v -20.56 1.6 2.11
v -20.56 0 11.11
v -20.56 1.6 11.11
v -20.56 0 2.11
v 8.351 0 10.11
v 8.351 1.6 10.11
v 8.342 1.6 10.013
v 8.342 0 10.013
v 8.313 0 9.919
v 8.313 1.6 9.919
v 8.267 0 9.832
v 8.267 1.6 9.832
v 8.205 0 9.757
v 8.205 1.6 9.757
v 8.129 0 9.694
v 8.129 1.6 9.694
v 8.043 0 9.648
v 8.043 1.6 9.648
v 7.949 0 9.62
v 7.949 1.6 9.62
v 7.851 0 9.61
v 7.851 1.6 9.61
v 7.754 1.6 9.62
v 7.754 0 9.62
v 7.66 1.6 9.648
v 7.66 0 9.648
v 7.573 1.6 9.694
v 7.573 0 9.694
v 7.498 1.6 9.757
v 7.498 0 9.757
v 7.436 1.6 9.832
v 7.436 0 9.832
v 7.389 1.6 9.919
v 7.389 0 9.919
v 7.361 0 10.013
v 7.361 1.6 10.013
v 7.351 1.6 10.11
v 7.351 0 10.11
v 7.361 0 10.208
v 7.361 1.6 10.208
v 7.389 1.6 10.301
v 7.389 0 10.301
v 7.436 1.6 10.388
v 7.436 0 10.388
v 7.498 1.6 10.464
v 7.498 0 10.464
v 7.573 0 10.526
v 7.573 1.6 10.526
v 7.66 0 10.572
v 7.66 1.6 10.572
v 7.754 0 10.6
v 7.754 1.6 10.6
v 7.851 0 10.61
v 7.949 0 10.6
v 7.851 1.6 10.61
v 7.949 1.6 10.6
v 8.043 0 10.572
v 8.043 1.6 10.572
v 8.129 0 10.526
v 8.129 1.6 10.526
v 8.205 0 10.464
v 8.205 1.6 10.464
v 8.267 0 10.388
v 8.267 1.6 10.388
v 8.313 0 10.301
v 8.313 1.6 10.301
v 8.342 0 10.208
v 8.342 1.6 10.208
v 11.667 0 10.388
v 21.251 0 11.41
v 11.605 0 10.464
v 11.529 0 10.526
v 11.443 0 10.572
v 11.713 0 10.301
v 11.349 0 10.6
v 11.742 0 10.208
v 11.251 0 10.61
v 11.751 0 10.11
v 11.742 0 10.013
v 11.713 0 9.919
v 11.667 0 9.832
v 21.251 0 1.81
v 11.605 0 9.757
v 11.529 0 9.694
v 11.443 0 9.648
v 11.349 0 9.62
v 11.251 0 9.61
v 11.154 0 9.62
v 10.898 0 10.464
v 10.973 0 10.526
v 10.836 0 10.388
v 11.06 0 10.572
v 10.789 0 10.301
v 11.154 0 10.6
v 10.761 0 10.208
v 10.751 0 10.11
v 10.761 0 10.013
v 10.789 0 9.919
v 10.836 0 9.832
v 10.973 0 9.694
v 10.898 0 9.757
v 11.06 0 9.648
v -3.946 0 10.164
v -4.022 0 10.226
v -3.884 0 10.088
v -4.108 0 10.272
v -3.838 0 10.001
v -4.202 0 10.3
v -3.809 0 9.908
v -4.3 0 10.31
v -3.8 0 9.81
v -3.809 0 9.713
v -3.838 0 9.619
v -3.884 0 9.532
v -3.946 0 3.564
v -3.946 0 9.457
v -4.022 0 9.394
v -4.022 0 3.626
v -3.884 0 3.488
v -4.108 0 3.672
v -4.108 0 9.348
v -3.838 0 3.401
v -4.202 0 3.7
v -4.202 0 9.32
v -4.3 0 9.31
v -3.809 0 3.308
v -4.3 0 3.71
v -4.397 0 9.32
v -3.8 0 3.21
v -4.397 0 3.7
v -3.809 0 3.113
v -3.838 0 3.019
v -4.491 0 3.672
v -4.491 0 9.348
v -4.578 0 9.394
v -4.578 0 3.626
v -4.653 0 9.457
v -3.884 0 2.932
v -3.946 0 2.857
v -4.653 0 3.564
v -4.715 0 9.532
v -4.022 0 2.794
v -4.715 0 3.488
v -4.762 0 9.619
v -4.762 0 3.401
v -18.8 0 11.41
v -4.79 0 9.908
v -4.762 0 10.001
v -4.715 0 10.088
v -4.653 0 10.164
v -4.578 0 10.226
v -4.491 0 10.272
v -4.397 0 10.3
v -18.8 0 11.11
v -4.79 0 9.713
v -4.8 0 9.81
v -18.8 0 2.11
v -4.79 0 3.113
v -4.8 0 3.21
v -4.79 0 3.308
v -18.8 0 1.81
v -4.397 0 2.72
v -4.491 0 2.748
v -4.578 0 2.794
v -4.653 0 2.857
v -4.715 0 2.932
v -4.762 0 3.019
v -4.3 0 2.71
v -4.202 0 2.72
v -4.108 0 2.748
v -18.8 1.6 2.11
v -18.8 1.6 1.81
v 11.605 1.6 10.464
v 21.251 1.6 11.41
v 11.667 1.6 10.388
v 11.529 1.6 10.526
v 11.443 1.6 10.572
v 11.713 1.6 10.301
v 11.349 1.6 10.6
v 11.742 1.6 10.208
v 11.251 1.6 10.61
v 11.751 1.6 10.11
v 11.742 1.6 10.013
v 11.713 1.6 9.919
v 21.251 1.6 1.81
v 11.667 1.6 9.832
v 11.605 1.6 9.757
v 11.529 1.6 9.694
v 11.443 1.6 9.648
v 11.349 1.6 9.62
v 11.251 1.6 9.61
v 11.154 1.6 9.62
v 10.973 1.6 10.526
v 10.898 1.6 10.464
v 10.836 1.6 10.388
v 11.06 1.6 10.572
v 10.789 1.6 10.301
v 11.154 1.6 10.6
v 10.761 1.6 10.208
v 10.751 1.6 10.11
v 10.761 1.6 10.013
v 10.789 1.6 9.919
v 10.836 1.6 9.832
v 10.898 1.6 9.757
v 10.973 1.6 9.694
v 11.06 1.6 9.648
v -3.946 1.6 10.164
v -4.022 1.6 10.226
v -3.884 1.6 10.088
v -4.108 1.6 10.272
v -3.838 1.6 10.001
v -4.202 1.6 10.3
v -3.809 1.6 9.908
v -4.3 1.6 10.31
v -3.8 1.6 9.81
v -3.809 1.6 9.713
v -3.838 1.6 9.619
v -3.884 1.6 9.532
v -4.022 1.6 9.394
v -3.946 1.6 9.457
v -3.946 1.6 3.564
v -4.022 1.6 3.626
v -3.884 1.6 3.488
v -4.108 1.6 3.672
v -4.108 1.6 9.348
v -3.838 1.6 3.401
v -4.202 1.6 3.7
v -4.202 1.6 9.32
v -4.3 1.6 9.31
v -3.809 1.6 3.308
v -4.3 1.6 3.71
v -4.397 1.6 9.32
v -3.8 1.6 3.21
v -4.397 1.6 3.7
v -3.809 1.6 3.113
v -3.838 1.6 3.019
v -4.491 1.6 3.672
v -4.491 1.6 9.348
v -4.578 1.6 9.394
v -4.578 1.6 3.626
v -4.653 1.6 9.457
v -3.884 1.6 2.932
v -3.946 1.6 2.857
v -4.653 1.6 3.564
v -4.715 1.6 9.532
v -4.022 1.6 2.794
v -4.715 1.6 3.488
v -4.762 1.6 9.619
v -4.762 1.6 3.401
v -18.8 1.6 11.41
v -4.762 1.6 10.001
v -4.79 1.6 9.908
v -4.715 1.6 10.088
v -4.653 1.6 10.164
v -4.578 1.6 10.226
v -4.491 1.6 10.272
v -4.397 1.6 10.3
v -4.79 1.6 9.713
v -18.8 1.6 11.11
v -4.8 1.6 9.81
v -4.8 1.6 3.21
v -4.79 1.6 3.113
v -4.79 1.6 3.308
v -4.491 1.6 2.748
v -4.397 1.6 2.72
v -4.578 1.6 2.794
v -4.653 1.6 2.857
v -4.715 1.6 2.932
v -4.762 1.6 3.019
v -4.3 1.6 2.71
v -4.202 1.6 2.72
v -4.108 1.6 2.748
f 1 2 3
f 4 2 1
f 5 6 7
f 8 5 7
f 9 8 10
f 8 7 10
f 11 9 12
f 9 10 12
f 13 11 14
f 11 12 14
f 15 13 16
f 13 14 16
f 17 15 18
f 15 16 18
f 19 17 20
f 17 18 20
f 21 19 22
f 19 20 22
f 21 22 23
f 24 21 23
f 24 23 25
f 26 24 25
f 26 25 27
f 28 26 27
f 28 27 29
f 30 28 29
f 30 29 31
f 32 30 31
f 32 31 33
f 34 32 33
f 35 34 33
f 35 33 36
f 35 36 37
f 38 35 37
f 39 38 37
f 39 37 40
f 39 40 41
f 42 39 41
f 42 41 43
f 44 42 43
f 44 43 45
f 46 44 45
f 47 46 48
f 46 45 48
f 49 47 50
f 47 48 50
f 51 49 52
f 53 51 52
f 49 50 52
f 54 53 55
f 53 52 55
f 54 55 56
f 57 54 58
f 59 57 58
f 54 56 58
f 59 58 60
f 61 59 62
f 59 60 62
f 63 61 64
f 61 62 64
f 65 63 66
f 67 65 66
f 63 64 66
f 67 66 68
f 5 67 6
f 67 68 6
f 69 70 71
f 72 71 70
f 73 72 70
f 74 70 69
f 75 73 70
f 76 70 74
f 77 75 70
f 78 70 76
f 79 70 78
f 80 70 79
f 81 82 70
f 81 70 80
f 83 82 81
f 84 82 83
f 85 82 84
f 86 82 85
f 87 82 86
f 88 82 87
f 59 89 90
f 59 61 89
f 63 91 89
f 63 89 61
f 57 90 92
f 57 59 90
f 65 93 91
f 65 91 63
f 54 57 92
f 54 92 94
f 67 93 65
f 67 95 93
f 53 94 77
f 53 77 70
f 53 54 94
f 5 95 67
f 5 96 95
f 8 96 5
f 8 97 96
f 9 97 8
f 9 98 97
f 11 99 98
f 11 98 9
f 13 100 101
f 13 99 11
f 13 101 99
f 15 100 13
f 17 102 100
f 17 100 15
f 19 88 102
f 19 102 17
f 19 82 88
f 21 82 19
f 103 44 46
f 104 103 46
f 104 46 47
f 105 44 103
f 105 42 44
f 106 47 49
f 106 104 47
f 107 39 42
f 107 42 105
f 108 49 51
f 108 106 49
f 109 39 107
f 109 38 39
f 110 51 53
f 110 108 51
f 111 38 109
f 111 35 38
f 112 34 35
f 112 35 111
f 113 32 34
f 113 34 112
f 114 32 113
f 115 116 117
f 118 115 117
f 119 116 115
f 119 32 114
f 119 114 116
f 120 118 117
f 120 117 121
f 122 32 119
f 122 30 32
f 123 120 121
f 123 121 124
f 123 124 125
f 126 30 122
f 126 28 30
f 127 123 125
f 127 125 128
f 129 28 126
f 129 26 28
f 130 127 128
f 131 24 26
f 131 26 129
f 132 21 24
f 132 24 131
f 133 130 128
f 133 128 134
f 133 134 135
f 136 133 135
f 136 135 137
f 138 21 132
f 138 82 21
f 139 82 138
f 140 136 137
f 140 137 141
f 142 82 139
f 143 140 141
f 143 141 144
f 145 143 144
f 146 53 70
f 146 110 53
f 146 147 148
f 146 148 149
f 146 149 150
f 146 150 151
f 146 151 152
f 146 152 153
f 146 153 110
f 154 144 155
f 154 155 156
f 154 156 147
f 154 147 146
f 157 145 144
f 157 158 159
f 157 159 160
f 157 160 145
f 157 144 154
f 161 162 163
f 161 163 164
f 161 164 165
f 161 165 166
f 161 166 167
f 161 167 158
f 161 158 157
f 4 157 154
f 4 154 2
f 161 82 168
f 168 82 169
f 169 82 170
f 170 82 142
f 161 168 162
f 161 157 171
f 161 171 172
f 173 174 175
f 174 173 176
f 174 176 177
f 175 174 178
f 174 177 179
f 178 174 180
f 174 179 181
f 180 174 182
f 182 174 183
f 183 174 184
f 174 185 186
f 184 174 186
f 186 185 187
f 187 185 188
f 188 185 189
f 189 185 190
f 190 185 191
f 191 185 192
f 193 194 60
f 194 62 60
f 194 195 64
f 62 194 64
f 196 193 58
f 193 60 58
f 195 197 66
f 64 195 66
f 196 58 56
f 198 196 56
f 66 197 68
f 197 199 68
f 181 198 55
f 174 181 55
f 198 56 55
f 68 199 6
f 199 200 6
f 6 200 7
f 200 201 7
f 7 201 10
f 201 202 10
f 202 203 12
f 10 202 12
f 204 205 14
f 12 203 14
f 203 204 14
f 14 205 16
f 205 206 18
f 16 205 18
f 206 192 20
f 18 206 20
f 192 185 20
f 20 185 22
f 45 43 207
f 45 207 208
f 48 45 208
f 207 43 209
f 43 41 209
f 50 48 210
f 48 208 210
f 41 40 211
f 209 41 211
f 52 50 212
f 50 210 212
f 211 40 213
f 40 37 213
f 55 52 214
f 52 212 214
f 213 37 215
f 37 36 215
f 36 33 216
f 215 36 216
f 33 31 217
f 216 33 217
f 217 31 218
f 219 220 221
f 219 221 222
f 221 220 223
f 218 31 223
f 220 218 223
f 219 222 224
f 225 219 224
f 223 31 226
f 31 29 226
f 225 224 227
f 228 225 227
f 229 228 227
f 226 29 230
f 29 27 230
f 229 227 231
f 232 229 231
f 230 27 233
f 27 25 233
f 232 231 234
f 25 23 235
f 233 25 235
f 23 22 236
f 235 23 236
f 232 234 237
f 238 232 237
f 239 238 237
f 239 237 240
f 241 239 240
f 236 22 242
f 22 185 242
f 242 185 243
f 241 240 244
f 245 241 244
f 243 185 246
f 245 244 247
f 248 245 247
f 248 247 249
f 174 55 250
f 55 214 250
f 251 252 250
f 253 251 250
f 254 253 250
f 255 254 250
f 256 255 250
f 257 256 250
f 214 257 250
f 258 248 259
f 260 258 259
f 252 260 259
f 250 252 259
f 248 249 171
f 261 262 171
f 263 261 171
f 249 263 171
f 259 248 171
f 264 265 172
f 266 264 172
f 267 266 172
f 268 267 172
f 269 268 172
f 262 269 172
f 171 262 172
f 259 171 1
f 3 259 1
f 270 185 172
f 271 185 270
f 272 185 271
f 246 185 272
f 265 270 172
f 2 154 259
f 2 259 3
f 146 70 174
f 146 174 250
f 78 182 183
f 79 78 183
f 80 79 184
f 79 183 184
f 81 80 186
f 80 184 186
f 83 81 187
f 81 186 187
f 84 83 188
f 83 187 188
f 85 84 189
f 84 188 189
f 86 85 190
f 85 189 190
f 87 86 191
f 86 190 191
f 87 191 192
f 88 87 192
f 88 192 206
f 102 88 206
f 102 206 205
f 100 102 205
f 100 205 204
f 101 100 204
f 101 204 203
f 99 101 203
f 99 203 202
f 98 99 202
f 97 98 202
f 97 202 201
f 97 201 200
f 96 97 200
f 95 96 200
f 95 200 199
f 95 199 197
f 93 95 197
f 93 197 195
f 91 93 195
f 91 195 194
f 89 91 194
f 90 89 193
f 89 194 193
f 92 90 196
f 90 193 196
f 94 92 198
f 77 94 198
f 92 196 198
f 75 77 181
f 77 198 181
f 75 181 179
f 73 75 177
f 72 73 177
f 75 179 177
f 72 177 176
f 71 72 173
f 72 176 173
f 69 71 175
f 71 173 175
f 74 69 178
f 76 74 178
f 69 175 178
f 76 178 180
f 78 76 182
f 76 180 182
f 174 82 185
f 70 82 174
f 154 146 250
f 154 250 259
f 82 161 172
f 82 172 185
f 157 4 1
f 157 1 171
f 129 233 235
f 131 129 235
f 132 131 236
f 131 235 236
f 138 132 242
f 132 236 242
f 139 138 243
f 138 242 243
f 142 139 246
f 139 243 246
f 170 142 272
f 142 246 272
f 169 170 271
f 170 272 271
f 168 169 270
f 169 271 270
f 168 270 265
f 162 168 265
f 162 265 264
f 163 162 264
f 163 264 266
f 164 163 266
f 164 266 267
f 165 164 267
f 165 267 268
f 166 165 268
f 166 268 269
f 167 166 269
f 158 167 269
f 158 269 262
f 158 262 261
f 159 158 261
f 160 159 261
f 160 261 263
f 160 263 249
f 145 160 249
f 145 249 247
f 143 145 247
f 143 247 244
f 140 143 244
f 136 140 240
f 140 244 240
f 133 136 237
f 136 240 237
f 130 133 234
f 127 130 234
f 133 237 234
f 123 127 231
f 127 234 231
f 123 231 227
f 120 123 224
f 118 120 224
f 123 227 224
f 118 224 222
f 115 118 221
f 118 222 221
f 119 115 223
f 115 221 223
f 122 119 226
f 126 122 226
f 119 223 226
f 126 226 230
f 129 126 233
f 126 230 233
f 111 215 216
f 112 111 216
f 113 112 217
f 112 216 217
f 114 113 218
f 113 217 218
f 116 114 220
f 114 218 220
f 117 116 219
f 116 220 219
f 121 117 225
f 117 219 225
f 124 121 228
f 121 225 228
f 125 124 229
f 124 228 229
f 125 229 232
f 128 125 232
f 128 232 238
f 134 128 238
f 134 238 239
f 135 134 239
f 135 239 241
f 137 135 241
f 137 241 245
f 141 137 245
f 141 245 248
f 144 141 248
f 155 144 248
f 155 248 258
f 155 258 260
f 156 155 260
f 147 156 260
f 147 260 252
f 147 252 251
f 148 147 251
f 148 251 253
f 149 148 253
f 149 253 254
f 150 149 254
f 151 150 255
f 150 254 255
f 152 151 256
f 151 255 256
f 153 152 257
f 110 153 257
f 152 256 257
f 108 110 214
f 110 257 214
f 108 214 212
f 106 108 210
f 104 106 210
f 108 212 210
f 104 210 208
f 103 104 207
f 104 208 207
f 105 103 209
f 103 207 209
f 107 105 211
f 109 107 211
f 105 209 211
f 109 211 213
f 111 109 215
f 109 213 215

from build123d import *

# Parameters (mm, degrees)
BOSS_EXTRUDE3_DEPTH     = 1.6
SKETCH2_R               = 0.5
CUT_EXTRUDE1_DEPTH      = 1
CUT_EXTRUDE1_DEPTH_BACK = 2.6


with BuildPart() as part:
    # Sketch1 → Boss-Extrude3 (new body)
    with BuildSketch(Plane(origin=(0, 0, 0), x_dir=(1, 0, 0), z_dir=(0, 1, 0))):
        Polygon((21.251265924, -1.81006359), (21.251265924, -11.41006359), (-18.799734076, -11.41006359), (-18.799734076, -11.11006359), (-20.559734076, -11.11006359), (-20.559734076, -2.11006359), (-18.799734076, -2.11006359), (-18.799734076, -1.81006359), align=None)
    extrude(amount=BOSS_EXTRUDE3_DEPTH)

    # Sketch2 → Cut-Extrude1 (cut, two sides)
    with BuildSketch(Plane(origin=(0, 1.6, 0), x_dir=(1, 0, 0), z_dir=(0, 1, 0))) as cut_extrude1_sk:
        with Locations((-4.299734334, -3.210062239)):
            Circle(SKETCH2_R)
        with Locations((-4.299734334, -9.810062239)):
            Circle(SKETCH2_R)
        with Locations((7.851265666, -10.110062239)):
            Circle(SKETCH2_R)
        with Locations((11.251265666, -10.110062239)):
            Circle(SKETCH2_R)
    extrude(amount=CUT_EXTRUDE1_DEPTH, mode=Mode.SUBTRACT)
    extrude(cut_extrude1_sk.sketch, amount=-CUT_EXTRUDE1_DEPTH_BACK, mode=Mode.SUBTRACT)


solid = part.part
